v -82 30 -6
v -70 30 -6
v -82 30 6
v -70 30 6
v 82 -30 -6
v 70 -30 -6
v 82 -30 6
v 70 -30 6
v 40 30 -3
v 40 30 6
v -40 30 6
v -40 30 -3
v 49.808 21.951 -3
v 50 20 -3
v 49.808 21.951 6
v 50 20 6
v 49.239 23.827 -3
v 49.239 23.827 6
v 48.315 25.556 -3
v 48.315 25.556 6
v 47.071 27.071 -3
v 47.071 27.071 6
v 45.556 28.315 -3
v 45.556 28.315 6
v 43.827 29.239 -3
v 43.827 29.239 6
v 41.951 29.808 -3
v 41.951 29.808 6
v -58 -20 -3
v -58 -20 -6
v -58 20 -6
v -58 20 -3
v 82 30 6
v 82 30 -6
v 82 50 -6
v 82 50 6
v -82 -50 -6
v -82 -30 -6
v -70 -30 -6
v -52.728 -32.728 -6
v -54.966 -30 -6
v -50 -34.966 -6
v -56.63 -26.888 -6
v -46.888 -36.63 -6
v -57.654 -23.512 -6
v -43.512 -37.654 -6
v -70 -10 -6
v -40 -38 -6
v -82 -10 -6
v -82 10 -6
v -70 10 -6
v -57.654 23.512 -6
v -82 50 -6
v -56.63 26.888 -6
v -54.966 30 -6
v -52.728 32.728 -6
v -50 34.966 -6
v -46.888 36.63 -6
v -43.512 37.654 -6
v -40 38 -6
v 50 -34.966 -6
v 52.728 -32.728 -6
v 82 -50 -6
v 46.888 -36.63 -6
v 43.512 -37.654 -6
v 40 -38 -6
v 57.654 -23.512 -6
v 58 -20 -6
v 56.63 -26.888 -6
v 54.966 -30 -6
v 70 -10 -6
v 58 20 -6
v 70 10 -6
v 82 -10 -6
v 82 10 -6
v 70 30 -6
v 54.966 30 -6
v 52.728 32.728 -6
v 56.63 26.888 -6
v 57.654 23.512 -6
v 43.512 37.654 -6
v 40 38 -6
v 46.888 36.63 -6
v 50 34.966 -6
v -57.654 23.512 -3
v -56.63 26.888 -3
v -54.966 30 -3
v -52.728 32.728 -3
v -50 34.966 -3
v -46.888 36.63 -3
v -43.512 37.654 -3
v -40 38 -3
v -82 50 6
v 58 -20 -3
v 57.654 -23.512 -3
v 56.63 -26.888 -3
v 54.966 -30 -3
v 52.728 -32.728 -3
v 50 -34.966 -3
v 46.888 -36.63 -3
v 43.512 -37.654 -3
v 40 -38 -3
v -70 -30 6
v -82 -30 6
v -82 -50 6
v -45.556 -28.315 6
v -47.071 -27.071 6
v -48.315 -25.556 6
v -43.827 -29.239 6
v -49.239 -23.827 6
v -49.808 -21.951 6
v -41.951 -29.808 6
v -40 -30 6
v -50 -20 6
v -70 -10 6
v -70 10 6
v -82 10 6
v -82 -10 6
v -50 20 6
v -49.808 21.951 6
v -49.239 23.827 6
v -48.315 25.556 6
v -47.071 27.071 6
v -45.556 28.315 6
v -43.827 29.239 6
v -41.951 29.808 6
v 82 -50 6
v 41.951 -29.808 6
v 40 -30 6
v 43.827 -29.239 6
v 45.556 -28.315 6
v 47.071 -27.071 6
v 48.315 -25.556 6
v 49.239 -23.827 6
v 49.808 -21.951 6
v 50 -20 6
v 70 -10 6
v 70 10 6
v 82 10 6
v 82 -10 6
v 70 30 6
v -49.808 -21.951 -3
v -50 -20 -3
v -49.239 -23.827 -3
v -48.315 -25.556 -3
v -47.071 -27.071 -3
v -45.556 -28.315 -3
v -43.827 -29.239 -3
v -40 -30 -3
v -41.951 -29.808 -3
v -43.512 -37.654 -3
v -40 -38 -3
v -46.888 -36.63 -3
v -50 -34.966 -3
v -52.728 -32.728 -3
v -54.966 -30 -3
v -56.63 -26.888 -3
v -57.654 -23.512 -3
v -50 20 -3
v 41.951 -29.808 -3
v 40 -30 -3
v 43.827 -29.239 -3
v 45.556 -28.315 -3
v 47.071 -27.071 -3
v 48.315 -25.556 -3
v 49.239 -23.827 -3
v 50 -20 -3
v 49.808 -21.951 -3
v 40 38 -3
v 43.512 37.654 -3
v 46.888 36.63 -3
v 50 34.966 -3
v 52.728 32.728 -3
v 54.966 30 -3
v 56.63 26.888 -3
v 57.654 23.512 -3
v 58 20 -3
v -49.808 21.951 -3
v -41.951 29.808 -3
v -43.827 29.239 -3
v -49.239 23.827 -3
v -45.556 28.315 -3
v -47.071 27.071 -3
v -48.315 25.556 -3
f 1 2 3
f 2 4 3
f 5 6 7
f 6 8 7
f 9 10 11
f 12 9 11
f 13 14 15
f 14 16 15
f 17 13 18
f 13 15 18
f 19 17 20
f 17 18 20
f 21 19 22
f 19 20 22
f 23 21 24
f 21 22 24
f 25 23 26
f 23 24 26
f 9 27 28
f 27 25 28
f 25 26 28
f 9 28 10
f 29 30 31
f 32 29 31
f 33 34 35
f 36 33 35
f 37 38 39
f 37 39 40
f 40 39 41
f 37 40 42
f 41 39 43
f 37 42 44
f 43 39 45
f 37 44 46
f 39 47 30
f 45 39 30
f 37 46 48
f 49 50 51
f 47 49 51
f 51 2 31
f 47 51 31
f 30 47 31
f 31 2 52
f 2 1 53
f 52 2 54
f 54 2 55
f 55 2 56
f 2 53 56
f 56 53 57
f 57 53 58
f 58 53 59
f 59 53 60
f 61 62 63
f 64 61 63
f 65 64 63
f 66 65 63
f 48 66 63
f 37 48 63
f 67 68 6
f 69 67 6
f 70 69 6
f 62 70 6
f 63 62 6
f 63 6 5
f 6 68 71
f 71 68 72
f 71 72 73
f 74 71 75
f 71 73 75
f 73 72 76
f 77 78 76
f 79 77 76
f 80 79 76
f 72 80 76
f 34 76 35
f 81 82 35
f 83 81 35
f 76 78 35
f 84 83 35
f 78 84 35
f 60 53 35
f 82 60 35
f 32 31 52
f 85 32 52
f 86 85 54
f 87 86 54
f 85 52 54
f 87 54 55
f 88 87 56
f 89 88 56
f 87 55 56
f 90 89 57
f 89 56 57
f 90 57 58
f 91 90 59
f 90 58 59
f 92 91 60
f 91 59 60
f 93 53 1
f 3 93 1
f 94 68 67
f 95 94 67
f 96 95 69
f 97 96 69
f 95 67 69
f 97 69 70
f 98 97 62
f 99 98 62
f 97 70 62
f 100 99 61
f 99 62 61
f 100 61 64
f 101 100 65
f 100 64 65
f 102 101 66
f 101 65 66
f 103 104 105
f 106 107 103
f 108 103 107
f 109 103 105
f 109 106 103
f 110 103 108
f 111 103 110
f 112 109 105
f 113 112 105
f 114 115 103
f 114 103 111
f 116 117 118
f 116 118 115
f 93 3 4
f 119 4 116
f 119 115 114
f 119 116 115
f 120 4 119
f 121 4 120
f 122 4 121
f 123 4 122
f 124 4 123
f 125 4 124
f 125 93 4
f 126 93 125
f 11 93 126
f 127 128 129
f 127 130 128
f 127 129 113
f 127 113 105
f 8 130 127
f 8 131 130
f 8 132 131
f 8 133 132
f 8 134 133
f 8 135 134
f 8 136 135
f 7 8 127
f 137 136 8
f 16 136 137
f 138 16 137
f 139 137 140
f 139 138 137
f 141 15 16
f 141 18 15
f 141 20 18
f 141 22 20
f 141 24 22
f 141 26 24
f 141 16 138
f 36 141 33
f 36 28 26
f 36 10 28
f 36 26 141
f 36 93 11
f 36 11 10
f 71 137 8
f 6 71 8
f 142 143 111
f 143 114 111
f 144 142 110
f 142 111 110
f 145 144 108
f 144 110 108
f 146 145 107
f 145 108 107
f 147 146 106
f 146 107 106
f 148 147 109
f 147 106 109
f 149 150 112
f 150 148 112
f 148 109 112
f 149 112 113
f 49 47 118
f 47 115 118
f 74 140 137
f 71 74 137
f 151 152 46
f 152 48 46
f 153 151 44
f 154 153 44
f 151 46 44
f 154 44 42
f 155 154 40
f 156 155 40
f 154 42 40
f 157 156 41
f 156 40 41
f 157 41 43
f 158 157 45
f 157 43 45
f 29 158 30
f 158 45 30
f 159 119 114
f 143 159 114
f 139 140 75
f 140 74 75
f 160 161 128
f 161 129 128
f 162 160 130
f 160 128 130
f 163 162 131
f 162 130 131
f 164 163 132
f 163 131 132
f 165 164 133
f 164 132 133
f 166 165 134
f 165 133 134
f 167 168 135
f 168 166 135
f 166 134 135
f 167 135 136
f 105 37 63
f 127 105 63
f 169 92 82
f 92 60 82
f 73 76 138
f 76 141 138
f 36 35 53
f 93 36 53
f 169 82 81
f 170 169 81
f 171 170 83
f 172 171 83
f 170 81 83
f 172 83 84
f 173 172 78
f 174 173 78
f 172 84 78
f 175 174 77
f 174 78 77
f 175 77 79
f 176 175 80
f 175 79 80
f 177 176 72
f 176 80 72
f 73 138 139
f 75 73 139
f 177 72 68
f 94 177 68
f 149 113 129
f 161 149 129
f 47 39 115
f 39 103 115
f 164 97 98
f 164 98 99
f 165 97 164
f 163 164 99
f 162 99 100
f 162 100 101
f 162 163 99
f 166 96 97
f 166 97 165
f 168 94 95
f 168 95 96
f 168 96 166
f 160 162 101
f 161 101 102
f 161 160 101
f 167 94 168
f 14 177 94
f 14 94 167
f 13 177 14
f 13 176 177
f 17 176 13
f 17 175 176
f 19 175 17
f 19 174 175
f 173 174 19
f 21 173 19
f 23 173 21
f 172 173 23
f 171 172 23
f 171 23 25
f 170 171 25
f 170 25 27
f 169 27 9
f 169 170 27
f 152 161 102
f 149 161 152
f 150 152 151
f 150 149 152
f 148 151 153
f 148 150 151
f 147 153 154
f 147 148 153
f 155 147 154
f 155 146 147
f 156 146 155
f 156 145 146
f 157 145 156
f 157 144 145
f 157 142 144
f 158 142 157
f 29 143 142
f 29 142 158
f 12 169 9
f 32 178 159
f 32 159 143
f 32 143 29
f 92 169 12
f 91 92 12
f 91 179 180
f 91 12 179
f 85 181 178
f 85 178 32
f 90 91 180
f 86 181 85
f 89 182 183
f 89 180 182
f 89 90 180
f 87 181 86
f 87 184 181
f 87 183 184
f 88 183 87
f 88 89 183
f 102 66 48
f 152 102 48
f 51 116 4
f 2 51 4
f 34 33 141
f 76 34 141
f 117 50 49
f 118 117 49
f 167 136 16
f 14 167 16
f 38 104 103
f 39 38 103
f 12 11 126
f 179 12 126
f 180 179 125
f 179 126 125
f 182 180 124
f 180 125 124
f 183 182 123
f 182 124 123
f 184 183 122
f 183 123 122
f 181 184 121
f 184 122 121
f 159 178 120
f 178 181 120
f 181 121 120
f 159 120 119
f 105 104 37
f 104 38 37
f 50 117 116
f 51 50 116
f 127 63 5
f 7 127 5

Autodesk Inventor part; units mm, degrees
ref_plane "YZ Plane" through (0, 0, 0) normal (1, 0, 0) x (0, 1, 0)
ref_plane "XZ Plane" through (0, 0, 0) normal (0, 1, 0) x (-1, 0, 0)
ref_plane "XY Plane" through (0, 0, 0) normal (0, 0, 1) x (1, 0, 0)
sketch "Sketch1" plane through (0, 0, 0) normal (0, 0, 1) x (1, 0, 0)
  line L0 (-82, -50) -> (82, -50)
  line L1 (82, -50) -> (82, 50)
  line L2 (82, 50) -> (-82, 50)
  line L3 (-82, 50) -> (-82, -50)
  line L4 (-82, -50) -> (82, 50) construction
  line L5 (82, -50) -> (-82, 50) construction
  point P0 (0, 0)
  dimension "d0" = 164
  dimension "d1" = 100
extrude "Extrusion1" add sketch "Sketch1" along normal mid plane 12
sketch "Sketch2" plane through (0, 0, 6) normal (0, 0, 1) x (1, 0, 0)
  line L0 (-82, 50) -> (-82, -50) projected
  line L1 (-82, -30) -> (-70, -30)
  line L2 (-70, -30) -> (-70, -10)
  line L3 (-70, -10) -> (-82, -10)
  line L4 (-82, -10) -> (-82, -30)
  line L5 (-82, -50) -> (82, -50) projected
  line L6 (-82, 10) -> (-70, 10)
  line L7 (-70, 10) -> (-70, 30)
  line L8 (-70, 30) -> (-82, 30)
  line L9 (-82, 30) -> (-82, 10)
  point P0 (0, 0)
  dimension "d4" = 12
  dimension "d5" = 20
  dimension "d6" = 20
  dimension "d7" = 20
  dimension "d8" = 20
extrude "Extrusion2" cut sketch "Sketch2" against normal through all
mirror "Mirror1" about plane through (0, 0, 0) normal (1, 0, 0) of "Extrusion2"
sketch "Sketch3" plane through (0, 0, 6) normal (0, 0, 1) x (1, 0, 0)
  line L0 (-40, -30) -> (40, -30)
  line L1 (50, -20) -> (50, 20)
  line L2 (40, 30) -> (-40, 30)
  line L3 (-50, 20) -> (-50, -20)
  line L4 (-50, -30) -> (50, 30) construction
  line L5 (50, -30) -> (-50, 30) construction
  arc A0 (-40, 30) -> (-50, 20) centre (-40, 20) ccw
  arc A1 (50, 20) -> (40, 30) centre (40, 20) ccw
  arc A2 (40, -30) -> (50, -20) centre (40, -20) ccw
  arc A3 (-50, -20) -> (-40, -30) centre (-40, -20) ccw
  point P0 (0, 0)
  dimension "d11" = 100
  dimension "d12" = 60
  dimension "d13" = 10
  dimension "d14" = 10
extrude "Extrusion3" cut sketch "Sketch3" against normal through all
sketch "Sketch5" plane through (0, 0, -6) normal (0, 0, -1) x (-1, 0, 0)
  line L0 (-40, 30) -> (40, 30) projected
  arc A0 (-40, 30) -> (-50, 20) centre (-40, 20) ccw projected
  line L1 (-50, -20) -> (-50, 20) projected
  arc A1 (-50, -20) -> (-40, -30) centre (-40, -20) ccw projected
  line L2 (40, -30) -> (-40, -30) projected
  arc A2 (40, -30) -> (50, -20) centre (40, -20) ccw projected
  line L3 (50, 20) -> (50, -20) projected
  arc A3 (50, 20) -> (40, 30) centre (40, 20) ccw projected
  line L4 (40, 38) -> (-40, 38)
  arc A4 (-40, 38) -> (-58, 20) centre (-40, 20) ccw
  line L5 (-58, 20) -> (-58, -20)
  arc A5 (-58, -20) -> (-40, -38) centre (-40, -20) ccw
  line L6 (-40, -38) -> (40, -38)
  arc A6 (40, -38) -> (58, -20) centre (40, -20) ccw
  line L7 (58, -20) -> (58, 20)
  arc A7 (58, 20) -> (40, 38) centre (40, 20) ccw
  point P0 (0, 0)
  dimension "d17" = 8
extrude "Extrusion4" cut sketch "Sketch5" against normal blind 3
properties part number "FRONT V2" material "Wood (Cherry)"
